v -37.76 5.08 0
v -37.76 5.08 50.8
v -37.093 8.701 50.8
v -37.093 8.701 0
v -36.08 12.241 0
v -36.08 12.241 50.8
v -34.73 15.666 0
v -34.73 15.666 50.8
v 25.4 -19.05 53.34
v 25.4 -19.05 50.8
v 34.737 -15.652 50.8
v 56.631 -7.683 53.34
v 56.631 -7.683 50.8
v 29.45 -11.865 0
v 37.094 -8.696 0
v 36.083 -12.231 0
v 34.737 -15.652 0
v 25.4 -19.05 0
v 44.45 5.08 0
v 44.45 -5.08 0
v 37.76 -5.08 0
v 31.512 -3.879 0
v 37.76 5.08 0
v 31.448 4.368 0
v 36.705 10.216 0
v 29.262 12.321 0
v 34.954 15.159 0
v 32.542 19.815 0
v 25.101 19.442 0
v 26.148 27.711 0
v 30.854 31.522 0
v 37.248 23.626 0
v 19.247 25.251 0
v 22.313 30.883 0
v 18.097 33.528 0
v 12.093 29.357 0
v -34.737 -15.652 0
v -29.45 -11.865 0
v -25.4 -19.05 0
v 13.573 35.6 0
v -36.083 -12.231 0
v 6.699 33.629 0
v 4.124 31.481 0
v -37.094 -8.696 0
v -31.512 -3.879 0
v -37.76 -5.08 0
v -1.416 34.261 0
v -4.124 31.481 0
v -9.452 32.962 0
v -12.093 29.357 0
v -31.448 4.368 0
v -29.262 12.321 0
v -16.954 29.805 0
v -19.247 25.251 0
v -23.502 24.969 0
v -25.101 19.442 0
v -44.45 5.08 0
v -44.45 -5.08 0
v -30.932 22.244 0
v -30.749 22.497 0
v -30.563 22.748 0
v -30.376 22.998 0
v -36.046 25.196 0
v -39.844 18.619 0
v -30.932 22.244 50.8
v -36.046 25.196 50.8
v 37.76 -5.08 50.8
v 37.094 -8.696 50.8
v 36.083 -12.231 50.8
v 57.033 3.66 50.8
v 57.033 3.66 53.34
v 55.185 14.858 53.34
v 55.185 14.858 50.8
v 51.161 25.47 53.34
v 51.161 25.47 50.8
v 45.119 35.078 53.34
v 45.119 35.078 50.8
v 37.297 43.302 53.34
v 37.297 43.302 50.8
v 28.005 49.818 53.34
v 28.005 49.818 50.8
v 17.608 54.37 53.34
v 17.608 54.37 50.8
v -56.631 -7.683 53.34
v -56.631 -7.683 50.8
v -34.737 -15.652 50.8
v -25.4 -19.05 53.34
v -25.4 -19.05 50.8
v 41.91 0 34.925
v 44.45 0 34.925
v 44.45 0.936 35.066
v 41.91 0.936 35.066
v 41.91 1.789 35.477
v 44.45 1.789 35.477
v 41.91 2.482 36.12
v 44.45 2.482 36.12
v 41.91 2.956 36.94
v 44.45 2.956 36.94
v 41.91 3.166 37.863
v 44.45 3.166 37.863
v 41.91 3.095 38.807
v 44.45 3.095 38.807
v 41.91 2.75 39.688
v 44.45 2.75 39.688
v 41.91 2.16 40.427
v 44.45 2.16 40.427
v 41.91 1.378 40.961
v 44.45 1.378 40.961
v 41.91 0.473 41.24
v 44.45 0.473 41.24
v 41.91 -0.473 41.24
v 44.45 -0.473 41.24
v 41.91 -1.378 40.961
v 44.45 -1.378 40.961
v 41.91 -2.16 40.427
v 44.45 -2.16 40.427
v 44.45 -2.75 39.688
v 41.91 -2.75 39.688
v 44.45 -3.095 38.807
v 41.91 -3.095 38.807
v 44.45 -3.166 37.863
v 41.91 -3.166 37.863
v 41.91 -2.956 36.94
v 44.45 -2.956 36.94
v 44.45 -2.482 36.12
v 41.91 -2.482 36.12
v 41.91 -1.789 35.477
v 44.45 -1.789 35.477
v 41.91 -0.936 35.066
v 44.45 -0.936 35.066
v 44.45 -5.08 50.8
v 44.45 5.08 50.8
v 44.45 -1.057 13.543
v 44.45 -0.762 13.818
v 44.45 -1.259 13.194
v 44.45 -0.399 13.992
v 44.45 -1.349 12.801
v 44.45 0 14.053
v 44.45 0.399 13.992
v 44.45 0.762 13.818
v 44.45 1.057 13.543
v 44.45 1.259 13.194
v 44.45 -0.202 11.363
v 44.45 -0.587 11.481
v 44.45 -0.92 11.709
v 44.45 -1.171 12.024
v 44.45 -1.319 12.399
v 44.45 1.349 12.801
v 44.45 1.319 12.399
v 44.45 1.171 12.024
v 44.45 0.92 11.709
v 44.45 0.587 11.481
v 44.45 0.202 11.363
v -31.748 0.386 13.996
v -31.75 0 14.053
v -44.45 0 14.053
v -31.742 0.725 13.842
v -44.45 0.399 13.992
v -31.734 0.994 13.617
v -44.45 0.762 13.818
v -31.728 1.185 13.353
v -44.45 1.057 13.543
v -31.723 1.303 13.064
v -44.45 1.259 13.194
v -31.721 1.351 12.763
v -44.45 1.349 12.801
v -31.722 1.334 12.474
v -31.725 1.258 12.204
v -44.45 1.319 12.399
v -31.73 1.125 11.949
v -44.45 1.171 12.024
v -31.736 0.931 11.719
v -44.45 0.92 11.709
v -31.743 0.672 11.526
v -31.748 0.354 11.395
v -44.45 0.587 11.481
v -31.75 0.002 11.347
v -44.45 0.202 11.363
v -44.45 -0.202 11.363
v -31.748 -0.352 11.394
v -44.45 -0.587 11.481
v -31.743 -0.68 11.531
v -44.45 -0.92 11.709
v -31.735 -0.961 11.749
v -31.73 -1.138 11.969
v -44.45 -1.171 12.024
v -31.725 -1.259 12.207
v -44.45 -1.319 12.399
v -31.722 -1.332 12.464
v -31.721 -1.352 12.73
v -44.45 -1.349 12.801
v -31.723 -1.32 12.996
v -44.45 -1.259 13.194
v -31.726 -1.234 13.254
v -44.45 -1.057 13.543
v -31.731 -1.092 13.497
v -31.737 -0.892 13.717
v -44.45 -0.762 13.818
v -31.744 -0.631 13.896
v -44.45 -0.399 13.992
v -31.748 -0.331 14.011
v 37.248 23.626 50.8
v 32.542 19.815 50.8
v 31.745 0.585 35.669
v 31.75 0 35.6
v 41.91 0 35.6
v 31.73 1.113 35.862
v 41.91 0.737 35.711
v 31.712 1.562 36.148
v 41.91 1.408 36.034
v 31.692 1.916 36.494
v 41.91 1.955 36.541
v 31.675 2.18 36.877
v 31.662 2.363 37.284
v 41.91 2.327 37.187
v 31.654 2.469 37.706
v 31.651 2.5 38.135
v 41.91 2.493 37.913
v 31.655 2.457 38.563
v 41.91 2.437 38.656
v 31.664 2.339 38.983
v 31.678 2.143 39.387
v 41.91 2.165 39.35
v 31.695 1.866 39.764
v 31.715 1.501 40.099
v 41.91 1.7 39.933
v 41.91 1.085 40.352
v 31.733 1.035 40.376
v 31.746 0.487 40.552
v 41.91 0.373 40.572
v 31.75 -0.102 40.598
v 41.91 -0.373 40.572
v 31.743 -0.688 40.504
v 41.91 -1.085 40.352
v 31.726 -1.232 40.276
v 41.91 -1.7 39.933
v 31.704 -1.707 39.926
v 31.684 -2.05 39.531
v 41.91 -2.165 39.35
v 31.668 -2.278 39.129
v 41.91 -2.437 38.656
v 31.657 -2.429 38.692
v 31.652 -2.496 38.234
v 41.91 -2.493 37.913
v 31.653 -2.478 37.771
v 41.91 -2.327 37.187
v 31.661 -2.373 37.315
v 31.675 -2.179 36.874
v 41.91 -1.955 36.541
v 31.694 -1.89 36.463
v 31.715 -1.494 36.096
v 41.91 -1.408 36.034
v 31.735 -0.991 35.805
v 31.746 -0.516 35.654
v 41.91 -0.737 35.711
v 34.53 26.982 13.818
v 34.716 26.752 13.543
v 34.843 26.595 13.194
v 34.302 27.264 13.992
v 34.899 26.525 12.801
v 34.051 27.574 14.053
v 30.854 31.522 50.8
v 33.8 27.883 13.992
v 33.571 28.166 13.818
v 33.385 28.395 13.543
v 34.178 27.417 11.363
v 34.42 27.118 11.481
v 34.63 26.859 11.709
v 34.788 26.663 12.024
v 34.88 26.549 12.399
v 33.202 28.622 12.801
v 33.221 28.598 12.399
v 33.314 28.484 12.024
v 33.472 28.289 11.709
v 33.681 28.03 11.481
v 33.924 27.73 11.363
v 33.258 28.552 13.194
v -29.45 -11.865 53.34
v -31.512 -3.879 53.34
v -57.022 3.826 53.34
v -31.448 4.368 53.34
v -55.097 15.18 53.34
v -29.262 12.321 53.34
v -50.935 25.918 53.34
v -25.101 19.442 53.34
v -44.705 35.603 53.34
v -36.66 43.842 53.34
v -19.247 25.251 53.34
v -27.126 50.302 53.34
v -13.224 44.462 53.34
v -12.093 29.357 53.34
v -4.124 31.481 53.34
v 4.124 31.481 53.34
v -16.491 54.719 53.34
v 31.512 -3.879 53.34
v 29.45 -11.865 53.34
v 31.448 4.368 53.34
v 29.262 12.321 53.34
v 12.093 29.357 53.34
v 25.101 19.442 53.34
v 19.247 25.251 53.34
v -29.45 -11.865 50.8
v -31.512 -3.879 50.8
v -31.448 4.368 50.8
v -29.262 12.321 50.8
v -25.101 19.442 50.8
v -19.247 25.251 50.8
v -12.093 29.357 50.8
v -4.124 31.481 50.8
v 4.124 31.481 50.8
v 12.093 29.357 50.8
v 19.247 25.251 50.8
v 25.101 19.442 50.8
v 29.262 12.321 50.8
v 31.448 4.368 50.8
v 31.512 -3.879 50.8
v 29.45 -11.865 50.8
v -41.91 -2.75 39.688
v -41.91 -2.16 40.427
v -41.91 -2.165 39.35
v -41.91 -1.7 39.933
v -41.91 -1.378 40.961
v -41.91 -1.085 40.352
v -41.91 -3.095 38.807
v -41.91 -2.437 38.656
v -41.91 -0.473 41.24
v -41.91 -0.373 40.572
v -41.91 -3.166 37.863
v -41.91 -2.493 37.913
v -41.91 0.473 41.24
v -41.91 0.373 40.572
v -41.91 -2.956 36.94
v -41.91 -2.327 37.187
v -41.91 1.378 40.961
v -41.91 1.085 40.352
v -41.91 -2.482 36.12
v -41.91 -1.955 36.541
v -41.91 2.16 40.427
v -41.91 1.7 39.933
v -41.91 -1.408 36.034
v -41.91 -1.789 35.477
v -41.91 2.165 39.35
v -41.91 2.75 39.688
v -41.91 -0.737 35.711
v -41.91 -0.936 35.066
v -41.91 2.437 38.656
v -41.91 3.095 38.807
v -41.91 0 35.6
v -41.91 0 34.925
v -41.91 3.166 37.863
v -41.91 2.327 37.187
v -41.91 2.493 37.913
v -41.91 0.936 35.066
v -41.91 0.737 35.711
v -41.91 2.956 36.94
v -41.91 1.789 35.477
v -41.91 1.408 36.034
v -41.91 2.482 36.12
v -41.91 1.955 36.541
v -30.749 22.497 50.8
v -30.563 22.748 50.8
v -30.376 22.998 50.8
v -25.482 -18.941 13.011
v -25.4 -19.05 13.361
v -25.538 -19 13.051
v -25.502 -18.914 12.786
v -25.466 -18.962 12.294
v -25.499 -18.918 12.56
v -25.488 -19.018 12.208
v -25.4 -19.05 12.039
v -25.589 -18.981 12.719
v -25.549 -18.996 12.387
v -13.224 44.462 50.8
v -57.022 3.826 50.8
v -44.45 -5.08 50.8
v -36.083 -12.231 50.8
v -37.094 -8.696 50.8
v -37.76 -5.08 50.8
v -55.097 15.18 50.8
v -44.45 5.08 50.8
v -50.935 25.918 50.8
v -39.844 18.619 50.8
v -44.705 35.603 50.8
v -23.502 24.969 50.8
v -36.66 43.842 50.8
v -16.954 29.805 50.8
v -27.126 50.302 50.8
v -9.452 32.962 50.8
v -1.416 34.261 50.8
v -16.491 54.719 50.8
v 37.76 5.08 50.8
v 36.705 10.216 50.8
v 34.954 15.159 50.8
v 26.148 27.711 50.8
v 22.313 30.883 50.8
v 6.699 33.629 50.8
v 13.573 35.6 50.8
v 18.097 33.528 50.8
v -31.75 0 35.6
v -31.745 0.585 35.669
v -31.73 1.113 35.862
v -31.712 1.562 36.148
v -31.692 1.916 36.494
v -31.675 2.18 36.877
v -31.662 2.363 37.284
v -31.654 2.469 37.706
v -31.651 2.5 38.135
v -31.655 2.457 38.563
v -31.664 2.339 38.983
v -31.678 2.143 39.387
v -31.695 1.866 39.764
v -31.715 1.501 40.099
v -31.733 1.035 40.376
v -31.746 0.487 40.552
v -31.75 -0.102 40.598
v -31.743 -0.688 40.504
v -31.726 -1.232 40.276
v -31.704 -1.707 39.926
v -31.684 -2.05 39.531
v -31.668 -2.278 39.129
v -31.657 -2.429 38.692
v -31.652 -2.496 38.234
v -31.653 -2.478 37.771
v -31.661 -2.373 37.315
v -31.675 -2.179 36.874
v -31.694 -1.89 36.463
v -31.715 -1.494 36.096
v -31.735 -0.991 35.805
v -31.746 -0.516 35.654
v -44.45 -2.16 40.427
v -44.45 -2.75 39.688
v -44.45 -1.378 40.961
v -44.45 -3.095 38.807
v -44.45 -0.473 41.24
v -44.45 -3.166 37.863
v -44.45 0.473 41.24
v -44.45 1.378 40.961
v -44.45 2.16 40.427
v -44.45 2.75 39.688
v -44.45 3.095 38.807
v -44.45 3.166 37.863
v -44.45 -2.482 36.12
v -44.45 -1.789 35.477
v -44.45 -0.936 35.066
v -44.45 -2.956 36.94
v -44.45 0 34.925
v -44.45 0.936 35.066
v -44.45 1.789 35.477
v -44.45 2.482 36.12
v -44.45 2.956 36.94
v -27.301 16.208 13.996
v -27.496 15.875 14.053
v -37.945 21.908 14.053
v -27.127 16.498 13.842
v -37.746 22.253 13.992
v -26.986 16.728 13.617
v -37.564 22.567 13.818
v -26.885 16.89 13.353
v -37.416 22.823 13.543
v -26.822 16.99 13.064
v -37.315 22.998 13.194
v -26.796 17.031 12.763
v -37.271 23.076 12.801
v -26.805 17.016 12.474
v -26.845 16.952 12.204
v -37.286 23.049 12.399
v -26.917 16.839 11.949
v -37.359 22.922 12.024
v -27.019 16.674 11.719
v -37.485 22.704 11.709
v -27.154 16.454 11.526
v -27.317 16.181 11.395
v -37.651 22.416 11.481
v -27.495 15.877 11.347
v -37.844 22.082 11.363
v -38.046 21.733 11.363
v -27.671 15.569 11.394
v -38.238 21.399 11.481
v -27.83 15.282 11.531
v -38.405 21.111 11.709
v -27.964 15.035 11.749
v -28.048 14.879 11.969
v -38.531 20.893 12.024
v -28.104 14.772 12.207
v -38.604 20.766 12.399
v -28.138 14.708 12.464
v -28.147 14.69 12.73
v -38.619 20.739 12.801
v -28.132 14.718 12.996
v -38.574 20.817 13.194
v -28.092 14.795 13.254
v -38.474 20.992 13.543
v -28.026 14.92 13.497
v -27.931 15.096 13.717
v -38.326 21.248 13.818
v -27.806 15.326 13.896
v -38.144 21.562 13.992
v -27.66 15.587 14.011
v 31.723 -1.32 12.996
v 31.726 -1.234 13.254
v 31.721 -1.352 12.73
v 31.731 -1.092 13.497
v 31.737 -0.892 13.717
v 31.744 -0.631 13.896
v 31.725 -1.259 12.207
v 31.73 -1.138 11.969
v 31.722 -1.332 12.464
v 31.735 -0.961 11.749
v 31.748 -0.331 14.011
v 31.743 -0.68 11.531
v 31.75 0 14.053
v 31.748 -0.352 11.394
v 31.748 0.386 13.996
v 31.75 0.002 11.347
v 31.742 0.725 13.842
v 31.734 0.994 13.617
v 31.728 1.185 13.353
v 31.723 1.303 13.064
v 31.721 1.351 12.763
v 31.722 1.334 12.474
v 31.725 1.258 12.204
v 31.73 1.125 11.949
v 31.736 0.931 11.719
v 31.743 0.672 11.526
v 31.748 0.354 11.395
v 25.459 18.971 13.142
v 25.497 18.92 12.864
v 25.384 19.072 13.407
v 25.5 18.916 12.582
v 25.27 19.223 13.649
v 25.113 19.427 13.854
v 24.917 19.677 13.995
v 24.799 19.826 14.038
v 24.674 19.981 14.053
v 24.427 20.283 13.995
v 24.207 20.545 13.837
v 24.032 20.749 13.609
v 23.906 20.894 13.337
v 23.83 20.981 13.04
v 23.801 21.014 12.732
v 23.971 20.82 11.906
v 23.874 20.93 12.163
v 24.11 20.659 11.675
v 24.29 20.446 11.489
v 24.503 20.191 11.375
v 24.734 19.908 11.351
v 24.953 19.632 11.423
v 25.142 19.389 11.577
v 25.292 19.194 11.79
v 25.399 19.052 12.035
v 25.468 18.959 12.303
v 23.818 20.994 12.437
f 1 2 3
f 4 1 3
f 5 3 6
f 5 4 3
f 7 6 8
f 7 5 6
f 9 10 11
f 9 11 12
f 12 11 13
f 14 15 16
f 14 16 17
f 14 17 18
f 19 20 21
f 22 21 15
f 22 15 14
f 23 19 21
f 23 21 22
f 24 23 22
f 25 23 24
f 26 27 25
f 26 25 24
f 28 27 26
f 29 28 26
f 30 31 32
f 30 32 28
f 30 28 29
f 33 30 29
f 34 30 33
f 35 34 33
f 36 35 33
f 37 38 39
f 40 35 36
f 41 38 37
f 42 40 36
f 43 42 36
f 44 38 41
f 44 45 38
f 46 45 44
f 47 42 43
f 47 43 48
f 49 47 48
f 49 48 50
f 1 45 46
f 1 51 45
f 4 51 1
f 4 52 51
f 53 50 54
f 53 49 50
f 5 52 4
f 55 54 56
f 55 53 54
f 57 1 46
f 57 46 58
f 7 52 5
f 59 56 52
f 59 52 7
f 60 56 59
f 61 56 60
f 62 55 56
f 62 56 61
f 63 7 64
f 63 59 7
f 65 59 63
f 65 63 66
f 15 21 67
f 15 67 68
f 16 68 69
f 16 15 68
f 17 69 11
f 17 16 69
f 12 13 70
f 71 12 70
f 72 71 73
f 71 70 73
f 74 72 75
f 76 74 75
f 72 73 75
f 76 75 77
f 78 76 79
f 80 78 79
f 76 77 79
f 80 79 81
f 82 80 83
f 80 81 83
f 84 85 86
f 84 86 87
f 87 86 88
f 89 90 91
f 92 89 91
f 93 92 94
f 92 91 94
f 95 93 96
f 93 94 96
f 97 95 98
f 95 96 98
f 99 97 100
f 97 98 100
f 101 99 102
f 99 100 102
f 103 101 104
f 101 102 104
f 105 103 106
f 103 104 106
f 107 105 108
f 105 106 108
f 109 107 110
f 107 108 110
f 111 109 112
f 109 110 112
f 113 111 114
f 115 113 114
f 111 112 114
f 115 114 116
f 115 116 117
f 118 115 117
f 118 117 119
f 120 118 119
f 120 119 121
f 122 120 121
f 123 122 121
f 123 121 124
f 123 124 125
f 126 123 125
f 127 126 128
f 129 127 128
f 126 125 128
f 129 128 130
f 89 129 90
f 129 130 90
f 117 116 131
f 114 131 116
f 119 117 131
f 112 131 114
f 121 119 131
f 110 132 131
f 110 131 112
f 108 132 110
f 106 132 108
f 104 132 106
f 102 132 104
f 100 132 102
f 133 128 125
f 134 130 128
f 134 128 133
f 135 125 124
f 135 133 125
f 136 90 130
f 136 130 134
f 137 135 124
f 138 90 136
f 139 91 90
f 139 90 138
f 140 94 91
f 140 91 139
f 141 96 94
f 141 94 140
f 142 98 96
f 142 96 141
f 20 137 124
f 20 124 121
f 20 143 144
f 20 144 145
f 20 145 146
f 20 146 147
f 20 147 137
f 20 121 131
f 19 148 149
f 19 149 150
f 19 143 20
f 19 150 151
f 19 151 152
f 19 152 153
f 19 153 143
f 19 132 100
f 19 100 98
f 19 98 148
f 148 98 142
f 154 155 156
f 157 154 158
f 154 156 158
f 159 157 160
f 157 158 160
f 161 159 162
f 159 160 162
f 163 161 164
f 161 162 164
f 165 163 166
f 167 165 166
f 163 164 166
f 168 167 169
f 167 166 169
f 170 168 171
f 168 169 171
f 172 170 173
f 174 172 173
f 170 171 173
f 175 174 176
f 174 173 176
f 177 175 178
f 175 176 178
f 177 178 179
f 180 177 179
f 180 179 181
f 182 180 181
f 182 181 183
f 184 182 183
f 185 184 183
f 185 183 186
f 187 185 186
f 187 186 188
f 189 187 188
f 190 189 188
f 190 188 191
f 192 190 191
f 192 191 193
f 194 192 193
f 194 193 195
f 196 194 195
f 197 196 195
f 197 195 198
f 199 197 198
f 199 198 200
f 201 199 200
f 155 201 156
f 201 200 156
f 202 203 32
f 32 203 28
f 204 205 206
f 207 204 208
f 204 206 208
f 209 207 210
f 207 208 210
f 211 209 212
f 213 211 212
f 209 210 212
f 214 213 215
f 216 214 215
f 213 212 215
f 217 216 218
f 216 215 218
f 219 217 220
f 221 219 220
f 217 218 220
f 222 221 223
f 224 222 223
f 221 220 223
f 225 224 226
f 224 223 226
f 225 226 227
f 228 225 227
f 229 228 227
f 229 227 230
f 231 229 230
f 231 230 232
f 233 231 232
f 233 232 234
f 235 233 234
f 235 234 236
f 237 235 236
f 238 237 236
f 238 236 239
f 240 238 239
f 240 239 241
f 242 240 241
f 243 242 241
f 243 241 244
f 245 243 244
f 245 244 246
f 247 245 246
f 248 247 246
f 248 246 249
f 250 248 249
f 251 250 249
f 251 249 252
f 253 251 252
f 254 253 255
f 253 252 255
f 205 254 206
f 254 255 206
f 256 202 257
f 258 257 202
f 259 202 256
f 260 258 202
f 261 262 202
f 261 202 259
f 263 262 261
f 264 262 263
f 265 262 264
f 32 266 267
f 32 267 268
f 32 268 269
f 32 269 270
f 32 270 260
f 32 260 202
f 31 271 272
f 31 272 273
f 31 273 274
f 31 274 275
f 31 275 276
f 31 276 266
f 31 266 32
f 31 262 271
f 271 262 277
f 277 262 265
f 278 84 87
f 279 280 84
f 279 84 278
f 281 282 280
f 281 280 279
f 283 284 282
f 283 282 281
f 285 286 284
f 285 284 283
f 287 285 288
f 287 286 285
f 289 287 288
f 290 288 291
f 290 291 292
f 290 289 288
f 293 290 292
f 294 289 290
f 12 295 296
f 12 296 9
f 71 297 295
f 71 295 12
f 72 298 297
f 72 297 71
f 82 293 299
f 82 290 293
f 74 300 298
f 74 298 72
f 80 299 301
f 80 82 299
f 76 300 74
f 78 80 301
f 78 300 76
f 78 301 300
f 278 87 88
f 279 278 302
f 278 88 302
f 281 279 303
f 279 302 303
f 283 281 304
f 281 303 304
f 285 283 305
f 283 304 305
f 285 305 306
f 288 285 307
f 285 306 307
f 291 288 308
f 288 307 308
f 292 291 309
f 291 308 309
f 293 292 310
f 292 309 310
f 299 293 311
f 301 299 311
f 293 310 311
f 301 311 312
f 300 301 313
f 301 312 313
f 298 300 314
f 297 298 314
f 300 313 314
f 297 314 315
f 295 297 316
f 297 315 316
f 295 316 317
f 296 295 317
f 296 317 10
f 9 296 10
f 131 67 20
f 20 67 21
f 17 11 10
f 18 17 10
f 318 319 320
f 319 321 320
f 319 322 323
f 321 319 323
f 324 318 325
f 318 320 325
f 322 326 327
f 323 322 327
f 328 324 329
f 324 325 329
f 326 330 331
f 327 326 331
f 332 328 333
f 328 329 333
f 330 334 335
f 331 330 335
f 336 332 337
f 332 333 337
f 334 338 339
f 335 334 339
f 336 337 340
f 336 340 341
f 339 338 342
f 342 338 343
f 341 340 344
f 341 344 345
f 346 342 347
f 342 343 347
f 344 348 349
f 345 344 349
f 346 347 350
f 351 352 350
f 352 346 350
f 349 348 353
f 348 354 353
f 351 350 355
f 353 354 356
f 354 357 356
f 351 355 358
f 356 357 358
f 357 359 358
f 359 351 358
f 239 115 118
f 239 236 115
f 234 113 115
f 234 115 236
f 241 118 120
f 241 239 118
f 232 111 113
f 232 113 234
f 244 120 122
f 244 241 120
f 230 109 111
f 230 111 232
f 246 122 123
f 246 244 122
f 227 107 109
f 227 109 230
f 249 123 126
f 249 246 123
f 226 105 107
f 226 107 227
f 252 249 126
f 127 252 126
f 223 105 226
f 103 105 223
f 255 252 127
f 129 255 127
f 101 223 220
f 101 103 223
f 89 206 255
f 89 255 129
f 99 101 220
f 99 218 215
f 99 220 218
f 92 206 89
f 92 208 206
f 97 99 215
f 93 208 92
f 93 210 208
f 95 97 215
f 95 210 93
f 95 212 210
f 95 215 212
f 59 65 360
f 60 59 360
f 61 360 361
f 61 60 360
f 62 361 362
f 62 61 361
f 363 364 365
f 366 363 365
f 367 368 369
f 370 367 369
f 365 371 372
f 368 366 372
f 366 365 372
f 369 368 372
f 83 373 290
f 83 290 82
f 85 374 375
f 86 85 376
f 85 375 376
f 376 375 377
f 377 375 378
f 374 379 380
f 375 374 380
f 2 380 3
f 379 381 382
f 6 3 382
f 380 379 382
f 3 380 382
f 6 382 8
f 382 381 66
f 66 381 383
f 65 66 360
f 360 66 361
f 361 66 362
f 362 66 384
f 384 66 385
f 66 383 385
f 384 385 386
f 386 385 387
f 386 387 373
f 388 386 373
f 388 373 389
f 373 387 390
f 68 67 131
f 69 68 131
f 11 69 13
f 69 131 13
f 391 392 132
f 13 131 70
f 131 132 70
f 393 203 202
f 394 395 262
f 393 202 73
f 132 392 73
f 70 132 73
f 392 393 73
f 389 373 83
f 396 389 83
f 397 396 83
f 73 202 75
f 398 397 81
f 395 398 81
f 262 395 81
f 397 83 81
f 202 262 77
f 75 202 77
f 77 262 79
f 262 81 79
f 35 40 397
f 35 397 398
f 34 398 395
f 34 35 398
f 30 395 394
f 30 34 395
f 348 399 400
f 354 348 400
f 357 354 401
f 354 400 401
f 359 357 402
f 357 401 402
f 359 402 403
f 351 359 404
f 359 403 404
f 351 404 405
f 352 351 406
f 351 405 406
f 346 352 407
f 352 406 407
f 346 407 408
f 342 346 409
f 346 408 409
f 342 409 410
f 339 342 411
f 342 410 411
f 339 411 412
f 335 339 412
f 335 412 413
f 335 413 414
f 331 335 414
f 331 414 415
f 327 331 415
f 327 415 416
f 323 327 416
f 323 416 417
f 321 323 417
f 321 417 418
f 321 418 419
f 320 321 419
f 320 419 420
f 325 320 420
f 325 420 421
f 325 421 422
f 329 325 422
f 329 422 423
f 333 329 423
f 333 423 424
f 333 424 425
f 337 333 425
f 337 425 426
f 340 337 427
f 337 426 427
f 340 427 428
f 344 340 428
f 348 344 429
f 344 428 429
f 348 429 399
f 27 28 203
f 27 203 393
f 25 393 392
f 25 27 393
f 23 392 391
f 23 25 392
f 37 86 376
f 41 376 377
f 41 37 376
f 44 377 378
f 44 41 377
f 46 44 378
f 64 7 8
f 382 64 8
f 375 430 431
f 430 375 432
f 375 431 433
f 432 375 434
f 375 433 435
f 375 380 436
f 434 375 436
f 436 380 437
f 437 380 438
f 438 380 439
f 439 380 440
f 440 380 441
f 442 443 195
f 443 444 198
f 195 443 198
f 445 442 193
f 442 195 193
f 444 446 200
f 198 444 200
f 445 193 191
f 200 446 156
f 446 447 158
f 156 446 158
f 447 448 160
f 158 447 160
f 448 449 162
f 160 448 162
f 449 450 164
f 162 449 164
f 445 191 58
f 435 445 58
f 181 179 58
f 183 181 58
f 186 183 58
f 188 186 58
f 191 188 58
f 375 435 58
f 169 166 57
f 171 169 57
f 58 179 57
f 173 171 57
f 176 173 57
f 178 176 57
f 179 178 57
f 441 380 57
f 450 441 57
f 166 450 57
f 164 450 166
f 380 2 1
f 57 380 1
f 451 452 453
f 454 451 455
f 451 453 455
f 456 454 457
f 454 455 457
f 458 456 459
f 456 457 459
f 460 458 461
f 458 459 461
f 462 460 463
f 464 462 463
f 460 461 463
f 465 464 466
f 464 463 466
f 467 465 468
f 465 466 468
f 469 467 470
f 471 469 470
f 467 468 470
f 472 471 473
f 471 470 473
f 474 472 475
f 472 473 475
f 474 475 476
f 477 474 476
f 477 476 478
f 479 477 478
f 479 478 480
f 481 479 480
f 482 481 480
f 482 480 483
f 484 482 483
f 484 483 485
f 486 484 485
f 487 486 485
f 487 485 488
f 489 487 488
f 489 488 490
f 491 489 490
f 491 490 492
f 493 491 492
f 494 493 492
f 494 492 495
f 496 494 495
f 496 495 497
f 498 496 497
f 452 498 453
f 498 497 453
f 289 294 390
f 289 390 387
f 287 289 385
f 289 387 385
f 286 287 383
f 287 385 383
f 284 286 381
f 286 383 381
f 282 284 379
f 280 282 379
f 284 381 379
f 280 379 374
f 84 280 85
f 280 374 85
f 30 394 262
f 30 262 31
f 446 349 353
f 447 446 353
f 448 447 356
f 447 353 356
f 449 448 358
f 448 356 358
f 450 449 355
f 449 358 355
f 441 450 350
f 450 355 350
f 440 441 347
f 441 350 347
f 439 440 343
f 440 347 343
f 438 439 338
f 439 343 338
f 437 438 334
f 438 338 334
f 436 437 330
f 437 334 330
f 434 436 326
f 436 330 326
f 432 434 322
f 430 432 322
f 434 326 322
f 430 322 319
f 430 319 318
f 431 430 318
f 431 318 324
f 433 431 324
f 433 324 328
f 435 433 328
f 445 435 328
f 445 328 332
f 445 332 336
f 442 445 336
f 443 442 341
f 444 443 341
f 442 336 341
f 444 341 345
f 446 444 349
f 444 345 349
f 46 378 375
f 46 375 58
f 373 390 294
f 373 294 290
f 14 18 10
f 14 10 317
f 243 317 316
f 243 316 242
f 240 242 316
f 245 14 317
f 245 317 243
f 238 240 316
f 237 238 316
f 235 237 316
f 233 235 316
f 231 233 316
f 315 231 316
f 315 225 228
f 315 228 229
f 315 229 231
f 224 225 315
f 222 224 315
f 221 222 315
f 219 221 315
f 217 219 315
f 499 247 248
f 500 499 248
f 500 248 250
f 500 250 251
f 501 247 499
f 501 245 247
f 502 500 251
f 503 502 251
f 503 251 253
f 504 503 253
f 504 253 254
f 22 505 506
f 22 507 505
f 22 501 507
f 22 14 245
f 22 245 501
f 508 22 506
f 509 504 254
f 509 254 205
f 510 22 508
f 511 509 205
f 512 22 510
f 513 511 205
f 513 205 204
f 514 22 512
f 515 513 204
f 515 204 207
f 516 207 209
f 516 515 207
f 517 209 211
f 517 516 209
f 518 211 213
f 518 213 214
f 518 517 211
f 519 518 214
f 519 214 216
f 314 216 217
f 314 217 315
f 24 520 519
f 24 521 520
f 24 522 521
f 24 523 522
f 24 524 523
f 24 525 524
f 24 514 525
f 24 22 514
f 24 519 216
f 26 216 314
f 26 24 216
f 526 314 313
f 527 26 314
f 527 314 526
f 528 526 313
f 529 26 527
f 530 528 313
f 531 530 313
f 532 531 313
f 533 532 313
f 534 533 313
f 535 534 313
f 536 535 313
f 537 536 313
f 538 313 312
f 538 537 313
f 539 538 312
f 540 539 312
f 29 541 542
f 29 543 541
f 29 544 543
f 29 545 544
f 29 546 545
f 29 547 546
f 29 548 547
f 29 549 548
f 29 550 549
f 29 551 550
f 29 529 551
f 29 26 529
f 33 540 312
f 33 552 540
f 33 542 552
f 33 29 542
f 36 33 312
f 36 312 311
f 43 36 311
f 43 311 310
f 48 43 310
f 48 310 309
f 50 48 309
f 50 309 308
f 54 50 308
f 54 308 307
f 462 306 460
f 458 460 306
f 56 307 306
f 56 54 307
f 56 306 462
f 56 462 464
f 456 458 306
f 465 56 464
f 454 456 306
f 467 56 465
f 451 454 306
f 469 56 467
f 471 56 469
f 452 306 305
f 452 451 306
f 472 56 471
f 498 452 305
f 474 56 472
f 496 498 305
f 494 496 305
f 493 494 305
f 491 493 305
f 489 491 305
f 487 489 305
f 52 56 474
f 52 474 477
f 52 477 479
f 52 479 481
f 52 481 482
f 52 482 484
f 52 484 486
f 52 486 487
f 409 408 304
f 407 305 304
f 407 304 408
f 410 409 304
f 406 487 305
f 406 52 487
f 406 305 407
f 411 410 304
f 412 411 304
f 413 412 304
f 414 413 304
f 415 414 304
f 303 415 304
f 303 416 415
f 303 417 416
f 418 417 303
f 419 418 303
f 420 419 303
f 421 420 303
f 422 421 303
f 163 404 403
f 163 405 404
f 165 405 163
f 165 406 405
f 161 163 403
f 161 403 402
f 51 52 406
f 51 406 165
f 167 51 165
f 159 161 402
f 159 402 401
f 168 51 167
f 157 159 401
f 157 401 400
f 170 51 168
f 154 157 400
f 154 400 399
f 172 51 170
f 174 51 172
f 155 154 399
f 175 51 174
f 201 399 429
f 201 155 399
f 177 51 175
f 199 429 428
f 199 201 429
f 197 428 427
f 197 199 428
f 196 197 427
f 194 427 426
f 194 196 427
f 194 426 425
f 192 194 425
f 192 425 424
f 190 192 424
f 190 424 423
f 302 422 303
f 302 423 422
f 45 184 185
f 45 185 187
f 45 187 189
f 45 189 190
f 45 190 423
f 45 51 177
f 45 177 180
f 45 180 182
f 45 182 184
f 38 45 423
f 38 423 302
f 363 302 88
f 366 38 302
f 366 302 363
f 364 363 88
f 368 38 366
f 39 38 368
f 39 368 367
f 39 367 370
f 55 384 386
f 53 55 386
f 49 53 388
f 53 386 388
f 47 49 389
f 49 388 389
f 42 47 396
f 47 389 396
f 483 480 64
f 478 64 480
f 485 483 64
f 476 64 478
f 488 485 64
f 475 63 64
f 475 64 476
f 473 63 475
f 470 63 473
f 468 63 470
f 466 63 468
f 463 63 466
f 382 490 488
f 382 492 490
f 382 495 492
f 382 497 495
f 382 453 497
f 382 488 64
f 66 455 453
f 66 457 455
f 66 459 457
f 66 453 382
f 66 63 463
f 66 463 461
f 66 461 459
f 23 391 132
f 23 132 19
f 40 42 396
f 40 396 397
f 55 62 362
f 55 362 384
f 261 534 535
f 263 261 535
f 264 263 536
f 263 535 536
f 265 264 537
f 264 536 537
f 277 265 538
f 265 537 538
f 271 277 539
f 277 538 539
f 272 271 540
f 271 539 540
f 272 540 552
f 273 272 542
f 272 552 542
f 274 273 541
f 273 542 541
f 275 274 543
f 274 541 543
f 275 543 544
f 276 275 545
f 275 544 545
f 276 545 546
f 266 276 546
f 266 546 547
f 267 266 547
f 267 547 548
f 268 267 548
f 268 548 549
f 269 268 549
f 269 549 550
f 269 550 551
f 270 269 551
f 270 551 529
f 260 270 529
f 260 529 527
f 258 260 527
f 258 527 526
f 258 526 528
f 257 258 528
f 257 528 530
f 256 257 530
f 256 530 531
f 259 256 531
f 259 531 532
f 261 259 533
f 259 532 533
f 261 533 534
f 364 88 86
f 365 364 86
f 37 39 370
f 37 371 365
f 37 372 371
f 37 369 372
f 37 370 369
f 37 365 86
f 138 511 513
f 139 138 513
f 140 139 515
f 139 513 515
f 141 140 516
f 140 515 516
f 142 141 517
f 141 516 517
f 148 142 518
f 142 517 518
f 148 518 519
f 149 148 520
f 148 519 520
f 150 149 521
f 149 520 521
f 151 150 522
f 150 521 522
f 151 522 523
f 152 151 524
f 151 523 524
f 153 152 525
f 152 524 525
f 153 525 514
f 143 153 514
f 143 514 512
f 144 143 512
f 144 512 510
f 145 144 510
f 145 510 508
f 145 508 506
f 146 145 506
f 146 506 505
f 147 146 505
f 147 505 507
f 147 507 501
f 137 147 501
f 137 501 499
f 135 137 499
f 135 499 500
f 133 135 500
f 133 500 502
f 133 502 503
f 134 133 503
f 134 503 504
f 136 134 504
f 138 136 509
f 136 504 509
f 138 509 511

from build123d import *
from build123d.topology import SkipClean

# Parameters (mm, degrees)
BOSS_EXTRUDE1_DEPTH        = 50.8
BOSS_EXTRUDE2_START        = 34.925
SKETCH2_W                  = 50.8
SKETCH2_H                  = 10.16
BOSS_EXTRUDE2_DEPTH        = 9.525
BOSS_EXTRUDE3_START        = -34.925
SKETCH2_3_W                = 50.8
SKETCH2_3_H                = 10.16
BOSS_EXTRUDE3_DEPTH        = 9.525
F_6_32_TAPPED_HOLE1_D      = 2.7051
SKETCH7_R                  = 2.5
CUT_EXTRUDE1_DEPTH         = 110.249531019
SKETCH8_R                  = 3.175
CUT_EXTRUDE2_DEPTH         = 2.54
CUT_EXTRUDE3_START         = -86.36
SKETCH8_2_R                = 3.175
CUT_EXTRUDE3_DEPTH         = 2.54
CUT_EXTRUDE4_DEPTH         = 78.511628283
SKETCH11_W                 = 50.8
SKETCH11_H                 = 10.16
BOSS_EXTRUDE4_DEPTH        = 8.89
SKETCH12_W                 = 50.8
SKETCH12_H                 = 7.595567884
BOSS_EXTRUDE5_DEPTH        = 8.89
F_6_32_TAPPED_HOLE2_D      = 2.7051
F_6_32_TAPPED_HOLE3_REACH  = 107.105
F_6_32_TAPPED_HOLE3_BORE_R = 1.35255
BOSS_EXTRUDE6_DEPTH        = 2.54
CUT_EXTRUDE6_START         = -2.54
CUT_EXTRUDE6_DEPTH         = 2.54


# Read off the part's stored shape, not the designer's step: Cut-Extrude6
with BuildPart() as part:
    # Sketch1 → Boss-Extrude1 (new body)
    with BuildSketch(Plane.XY):
        with BuildLine():
            Line((-25.4, -19.05), (-34.736620143, -15.651748179))
            ThreePointArc((-34.736620143, -15.651748179), (0, 38.1), (34.736620143, -15.651748179))
            Line((34.736620143, -15.651748179), (25.4, -19.05))
            ThreePointArc((25.4, -19.05), (0, 31.75), (-25.4, -19.05))
        make_face()
    extrude(amount=BOSS_EXTRUDE1_DEPTH)

    # Sketch2 → Boss-Extrude2 (add)
    with BuildSketch(Plane(origin=(0, 0, 0), x_dir=(0, 0, -1), z_dir=(1, 0, 0)).offset(BOSS_EXTRUDE2_START)):
        with Locations((-25.4, 0)):
            Rectangle(SKETCH2_W, SKETCH2_H)
    extrude(amount=BOSS_EXTRUDE2_DEPTH)

    # Sketch2<3> → Boss-Extrude3 (add)
    with BuildSketch(Plane(origin=(0, 0, 0), x_dir=(0, 0, -1), z_dir=(1, 0, 0)).offset(BOSS_EXTRUDE3_START)):
        with Locations((-25.4, 0)):
            Rectangle(SKETCH2_3_W, SKETCH2_3_H)
    extrude(amount=-BOSS_EXTRUDE3_DEPTH)

    # #6-32 Tapped Hole1 (through all)
    with Locations(Plane(origin=(44.45, 0, 0), x_dir=(0, 0, -1), z_dir=(1, 0, 0))):
        with Locations((-12.7, 0)):
            Hole(F_6_32_TAPPED_HOLE1_D / 2)

    # Sketch7 → Cut-Extrude1 (cut, through all)
    with BuildSketch(Plane(origin=(44.45, 0, 0), x_dir=(0, 0, -1), z_dir=(1, 0, 0))):
        with Locations((-38.1, 0)):
            Circle(SKETCH7_R)
    extrude(amount=-CUT_EXTRUDE1_DEPTH, mode=Mode.SUBTRACT)

    # Sketch8 → Cut-Extrude2 (cut)
    with BuildSketch(Plane(origin=(44.45, 0, 0), x_dir=(0, 0, -1), z_dir=(1, 0, 0))):
        with Locations((-38.1, 0)):
            Circle(SKETCH8_R)
    extrude(amount=-CUT_EXTRUDE2_DEPTH, mode=Mode.SUBTRACT)

    # Sketch8<2> → Cut-Extrude3 (cut)
    with BuildSketch(Plane(origin=(44.45, 0, 0), x_dir=(0, 0, -1), z_dir=(1, 0, 0)).offset(CUT_EXTRUDE3_START)):
        with Locations((-38.1, 0)):
            Circle(SKETCH8_2_R)
    extrude(amount=-CUT_EXTRUDE3_DEPTH, mode=Mode.SUBTRACT)

    # Sketch9 → Cut-Extrude4 (cut, through all)
    with BuildSketch(Plane.XY.offset(50.8)):
        with BuildLine():
            Line((6.699064553, 33.629252655), (17.438088821, 36.708618311))
            ThreePointArc((17.438088821, 36.708618311), (-11.20190214, 39.065675323), (-34.240942031, 21.889894674))
            Line((-34.240942031, 21.889894674), (-23.501917764, 24.96926033))
            ThreePointArc((-23.501917764, 24.96926033), (-9.451604931, 32.961663554), (6.699064553, 33.629252655))
        make_face()
    extrude(amount=-CUT_EXTRUDE4_DEPTH, mode=Mode.SUBTRACT)

    # Sketch11 → Boss-Extrude4 (add)
    with BuildSketch(Plane(origin=(27.141822704, 21.979014657, 0), x_dir=(0, 0, -1), z_dir=(0.77714596145697, 0.6293203910498384, 0))):
        with Locations((-25.4, 0)):
            Rectangle(SKETCH11_W, SKETCH11_H)
    extrude(amount=BOSS_EXTRUDE4_DEPTH)

    # Sketch12 → Boss-Extrude5 (add)
    with BuildSketch(Plane(origin=(-30.245937227, 17.4625, 0), x_dir=(0, 0, 1), z_dir=(-0.8660254037844417, 0.4999999999999946, 0))):
        with Locations((25.4, 0)):
            Rectangle(SKETCH12_W, SKETCH12_H)
    extrude(amount=BOSS_EXTRUDE5_DEPTH)

    # #6-32 Tapped Hole2 (through all)
    with Locations(Plane(origin=(34.050650301, 27.573672934, 0), x_dir=(0, 0, -1), z_dir=(0.7771459614569701, 0.6293203910498384, 0))):
        with Locations((-12.7, 0)):
            Hole(F_6_32_TAPPED_HOLE2_D / 2)

    # #6-32 Tapped Hole3 bore → #6-32 Tapped Hole3 (cut, up to next)
    with BuildSketch(Plane(origin=(-37.944903067, 21.9075, 0), x_dir=(0, 0, 1), z_dir=(-0.8660254037844414, 0.4999999999999951, 0)), mode=Mode.PRIVATE) as f_6_32_tapped_hole3_sk1:
        with Locations((12.7, 0)):
            Circle(F_6_32_TAPPED_HOLE3_BORE_R)
    f_6_32_tapped_hole3_tool1 = extrude(f_6_32_tapped_hole3_sk1.sketch, amount=-F_6_32_TAPPED_HOLE3_REACH, mode=Mode.PRIVATE) & part.part
    add(f_6_32_tapped_hole3_tool1.solids().sort_by_distance((-37.944903, 21.9075, 12.7))[0], mode=Mode.SUBTRACT)

    # Sketch18 → Boss-Extrude6 (add)
    with SkipClean():  # the faces are left unmerged after this step: merging them gives an invalid solid
        with BuildSketch(Plane.XY.offset(50.8)):
            with BuildLine():
                Line((25.4, -19.05), (56.631243544, -7.682756971))
                ThreePointArc((56.631243544, -7.682756971), (0, 57.15), (-56.631243544, -7.682756971))
                Line((-56.631243544, -7.682756971), (-25.4, -19.05))
                ThreePointArc((-25.4, -19.05), (0, 31.75), (25.4, -19.05))
            make_face()
        extrude(amount=BOSS_EXTRUDE6_DEPTH)

    # Cut-Extrude6 outline → Cut-Extrude6 (cut)
    with SkipClean():  # the faces are left unmerged after this step: merging them gives an invalid solid
        with BuildSketch(Plane.XY.offset(53.34).offset(CUT_EXTRUDE6_START)):
            with BuildLine():
                Line((-16.491428664, 54.718874994), (-13.224275773, 44.4624488))
                Line((-13.224275773, 44.4624488), (17.608042575, 54.369838483))
                ThreePointArc((17.608042575, 54.369838483), (0.584947244, 57.147006367), (-16.491428664, 54.718874994))
            make_face()
        extrude(amount=CUT_EXTRUDE6_DEPTH, mode=Mode.SUBTRACT)


solid = part.part
